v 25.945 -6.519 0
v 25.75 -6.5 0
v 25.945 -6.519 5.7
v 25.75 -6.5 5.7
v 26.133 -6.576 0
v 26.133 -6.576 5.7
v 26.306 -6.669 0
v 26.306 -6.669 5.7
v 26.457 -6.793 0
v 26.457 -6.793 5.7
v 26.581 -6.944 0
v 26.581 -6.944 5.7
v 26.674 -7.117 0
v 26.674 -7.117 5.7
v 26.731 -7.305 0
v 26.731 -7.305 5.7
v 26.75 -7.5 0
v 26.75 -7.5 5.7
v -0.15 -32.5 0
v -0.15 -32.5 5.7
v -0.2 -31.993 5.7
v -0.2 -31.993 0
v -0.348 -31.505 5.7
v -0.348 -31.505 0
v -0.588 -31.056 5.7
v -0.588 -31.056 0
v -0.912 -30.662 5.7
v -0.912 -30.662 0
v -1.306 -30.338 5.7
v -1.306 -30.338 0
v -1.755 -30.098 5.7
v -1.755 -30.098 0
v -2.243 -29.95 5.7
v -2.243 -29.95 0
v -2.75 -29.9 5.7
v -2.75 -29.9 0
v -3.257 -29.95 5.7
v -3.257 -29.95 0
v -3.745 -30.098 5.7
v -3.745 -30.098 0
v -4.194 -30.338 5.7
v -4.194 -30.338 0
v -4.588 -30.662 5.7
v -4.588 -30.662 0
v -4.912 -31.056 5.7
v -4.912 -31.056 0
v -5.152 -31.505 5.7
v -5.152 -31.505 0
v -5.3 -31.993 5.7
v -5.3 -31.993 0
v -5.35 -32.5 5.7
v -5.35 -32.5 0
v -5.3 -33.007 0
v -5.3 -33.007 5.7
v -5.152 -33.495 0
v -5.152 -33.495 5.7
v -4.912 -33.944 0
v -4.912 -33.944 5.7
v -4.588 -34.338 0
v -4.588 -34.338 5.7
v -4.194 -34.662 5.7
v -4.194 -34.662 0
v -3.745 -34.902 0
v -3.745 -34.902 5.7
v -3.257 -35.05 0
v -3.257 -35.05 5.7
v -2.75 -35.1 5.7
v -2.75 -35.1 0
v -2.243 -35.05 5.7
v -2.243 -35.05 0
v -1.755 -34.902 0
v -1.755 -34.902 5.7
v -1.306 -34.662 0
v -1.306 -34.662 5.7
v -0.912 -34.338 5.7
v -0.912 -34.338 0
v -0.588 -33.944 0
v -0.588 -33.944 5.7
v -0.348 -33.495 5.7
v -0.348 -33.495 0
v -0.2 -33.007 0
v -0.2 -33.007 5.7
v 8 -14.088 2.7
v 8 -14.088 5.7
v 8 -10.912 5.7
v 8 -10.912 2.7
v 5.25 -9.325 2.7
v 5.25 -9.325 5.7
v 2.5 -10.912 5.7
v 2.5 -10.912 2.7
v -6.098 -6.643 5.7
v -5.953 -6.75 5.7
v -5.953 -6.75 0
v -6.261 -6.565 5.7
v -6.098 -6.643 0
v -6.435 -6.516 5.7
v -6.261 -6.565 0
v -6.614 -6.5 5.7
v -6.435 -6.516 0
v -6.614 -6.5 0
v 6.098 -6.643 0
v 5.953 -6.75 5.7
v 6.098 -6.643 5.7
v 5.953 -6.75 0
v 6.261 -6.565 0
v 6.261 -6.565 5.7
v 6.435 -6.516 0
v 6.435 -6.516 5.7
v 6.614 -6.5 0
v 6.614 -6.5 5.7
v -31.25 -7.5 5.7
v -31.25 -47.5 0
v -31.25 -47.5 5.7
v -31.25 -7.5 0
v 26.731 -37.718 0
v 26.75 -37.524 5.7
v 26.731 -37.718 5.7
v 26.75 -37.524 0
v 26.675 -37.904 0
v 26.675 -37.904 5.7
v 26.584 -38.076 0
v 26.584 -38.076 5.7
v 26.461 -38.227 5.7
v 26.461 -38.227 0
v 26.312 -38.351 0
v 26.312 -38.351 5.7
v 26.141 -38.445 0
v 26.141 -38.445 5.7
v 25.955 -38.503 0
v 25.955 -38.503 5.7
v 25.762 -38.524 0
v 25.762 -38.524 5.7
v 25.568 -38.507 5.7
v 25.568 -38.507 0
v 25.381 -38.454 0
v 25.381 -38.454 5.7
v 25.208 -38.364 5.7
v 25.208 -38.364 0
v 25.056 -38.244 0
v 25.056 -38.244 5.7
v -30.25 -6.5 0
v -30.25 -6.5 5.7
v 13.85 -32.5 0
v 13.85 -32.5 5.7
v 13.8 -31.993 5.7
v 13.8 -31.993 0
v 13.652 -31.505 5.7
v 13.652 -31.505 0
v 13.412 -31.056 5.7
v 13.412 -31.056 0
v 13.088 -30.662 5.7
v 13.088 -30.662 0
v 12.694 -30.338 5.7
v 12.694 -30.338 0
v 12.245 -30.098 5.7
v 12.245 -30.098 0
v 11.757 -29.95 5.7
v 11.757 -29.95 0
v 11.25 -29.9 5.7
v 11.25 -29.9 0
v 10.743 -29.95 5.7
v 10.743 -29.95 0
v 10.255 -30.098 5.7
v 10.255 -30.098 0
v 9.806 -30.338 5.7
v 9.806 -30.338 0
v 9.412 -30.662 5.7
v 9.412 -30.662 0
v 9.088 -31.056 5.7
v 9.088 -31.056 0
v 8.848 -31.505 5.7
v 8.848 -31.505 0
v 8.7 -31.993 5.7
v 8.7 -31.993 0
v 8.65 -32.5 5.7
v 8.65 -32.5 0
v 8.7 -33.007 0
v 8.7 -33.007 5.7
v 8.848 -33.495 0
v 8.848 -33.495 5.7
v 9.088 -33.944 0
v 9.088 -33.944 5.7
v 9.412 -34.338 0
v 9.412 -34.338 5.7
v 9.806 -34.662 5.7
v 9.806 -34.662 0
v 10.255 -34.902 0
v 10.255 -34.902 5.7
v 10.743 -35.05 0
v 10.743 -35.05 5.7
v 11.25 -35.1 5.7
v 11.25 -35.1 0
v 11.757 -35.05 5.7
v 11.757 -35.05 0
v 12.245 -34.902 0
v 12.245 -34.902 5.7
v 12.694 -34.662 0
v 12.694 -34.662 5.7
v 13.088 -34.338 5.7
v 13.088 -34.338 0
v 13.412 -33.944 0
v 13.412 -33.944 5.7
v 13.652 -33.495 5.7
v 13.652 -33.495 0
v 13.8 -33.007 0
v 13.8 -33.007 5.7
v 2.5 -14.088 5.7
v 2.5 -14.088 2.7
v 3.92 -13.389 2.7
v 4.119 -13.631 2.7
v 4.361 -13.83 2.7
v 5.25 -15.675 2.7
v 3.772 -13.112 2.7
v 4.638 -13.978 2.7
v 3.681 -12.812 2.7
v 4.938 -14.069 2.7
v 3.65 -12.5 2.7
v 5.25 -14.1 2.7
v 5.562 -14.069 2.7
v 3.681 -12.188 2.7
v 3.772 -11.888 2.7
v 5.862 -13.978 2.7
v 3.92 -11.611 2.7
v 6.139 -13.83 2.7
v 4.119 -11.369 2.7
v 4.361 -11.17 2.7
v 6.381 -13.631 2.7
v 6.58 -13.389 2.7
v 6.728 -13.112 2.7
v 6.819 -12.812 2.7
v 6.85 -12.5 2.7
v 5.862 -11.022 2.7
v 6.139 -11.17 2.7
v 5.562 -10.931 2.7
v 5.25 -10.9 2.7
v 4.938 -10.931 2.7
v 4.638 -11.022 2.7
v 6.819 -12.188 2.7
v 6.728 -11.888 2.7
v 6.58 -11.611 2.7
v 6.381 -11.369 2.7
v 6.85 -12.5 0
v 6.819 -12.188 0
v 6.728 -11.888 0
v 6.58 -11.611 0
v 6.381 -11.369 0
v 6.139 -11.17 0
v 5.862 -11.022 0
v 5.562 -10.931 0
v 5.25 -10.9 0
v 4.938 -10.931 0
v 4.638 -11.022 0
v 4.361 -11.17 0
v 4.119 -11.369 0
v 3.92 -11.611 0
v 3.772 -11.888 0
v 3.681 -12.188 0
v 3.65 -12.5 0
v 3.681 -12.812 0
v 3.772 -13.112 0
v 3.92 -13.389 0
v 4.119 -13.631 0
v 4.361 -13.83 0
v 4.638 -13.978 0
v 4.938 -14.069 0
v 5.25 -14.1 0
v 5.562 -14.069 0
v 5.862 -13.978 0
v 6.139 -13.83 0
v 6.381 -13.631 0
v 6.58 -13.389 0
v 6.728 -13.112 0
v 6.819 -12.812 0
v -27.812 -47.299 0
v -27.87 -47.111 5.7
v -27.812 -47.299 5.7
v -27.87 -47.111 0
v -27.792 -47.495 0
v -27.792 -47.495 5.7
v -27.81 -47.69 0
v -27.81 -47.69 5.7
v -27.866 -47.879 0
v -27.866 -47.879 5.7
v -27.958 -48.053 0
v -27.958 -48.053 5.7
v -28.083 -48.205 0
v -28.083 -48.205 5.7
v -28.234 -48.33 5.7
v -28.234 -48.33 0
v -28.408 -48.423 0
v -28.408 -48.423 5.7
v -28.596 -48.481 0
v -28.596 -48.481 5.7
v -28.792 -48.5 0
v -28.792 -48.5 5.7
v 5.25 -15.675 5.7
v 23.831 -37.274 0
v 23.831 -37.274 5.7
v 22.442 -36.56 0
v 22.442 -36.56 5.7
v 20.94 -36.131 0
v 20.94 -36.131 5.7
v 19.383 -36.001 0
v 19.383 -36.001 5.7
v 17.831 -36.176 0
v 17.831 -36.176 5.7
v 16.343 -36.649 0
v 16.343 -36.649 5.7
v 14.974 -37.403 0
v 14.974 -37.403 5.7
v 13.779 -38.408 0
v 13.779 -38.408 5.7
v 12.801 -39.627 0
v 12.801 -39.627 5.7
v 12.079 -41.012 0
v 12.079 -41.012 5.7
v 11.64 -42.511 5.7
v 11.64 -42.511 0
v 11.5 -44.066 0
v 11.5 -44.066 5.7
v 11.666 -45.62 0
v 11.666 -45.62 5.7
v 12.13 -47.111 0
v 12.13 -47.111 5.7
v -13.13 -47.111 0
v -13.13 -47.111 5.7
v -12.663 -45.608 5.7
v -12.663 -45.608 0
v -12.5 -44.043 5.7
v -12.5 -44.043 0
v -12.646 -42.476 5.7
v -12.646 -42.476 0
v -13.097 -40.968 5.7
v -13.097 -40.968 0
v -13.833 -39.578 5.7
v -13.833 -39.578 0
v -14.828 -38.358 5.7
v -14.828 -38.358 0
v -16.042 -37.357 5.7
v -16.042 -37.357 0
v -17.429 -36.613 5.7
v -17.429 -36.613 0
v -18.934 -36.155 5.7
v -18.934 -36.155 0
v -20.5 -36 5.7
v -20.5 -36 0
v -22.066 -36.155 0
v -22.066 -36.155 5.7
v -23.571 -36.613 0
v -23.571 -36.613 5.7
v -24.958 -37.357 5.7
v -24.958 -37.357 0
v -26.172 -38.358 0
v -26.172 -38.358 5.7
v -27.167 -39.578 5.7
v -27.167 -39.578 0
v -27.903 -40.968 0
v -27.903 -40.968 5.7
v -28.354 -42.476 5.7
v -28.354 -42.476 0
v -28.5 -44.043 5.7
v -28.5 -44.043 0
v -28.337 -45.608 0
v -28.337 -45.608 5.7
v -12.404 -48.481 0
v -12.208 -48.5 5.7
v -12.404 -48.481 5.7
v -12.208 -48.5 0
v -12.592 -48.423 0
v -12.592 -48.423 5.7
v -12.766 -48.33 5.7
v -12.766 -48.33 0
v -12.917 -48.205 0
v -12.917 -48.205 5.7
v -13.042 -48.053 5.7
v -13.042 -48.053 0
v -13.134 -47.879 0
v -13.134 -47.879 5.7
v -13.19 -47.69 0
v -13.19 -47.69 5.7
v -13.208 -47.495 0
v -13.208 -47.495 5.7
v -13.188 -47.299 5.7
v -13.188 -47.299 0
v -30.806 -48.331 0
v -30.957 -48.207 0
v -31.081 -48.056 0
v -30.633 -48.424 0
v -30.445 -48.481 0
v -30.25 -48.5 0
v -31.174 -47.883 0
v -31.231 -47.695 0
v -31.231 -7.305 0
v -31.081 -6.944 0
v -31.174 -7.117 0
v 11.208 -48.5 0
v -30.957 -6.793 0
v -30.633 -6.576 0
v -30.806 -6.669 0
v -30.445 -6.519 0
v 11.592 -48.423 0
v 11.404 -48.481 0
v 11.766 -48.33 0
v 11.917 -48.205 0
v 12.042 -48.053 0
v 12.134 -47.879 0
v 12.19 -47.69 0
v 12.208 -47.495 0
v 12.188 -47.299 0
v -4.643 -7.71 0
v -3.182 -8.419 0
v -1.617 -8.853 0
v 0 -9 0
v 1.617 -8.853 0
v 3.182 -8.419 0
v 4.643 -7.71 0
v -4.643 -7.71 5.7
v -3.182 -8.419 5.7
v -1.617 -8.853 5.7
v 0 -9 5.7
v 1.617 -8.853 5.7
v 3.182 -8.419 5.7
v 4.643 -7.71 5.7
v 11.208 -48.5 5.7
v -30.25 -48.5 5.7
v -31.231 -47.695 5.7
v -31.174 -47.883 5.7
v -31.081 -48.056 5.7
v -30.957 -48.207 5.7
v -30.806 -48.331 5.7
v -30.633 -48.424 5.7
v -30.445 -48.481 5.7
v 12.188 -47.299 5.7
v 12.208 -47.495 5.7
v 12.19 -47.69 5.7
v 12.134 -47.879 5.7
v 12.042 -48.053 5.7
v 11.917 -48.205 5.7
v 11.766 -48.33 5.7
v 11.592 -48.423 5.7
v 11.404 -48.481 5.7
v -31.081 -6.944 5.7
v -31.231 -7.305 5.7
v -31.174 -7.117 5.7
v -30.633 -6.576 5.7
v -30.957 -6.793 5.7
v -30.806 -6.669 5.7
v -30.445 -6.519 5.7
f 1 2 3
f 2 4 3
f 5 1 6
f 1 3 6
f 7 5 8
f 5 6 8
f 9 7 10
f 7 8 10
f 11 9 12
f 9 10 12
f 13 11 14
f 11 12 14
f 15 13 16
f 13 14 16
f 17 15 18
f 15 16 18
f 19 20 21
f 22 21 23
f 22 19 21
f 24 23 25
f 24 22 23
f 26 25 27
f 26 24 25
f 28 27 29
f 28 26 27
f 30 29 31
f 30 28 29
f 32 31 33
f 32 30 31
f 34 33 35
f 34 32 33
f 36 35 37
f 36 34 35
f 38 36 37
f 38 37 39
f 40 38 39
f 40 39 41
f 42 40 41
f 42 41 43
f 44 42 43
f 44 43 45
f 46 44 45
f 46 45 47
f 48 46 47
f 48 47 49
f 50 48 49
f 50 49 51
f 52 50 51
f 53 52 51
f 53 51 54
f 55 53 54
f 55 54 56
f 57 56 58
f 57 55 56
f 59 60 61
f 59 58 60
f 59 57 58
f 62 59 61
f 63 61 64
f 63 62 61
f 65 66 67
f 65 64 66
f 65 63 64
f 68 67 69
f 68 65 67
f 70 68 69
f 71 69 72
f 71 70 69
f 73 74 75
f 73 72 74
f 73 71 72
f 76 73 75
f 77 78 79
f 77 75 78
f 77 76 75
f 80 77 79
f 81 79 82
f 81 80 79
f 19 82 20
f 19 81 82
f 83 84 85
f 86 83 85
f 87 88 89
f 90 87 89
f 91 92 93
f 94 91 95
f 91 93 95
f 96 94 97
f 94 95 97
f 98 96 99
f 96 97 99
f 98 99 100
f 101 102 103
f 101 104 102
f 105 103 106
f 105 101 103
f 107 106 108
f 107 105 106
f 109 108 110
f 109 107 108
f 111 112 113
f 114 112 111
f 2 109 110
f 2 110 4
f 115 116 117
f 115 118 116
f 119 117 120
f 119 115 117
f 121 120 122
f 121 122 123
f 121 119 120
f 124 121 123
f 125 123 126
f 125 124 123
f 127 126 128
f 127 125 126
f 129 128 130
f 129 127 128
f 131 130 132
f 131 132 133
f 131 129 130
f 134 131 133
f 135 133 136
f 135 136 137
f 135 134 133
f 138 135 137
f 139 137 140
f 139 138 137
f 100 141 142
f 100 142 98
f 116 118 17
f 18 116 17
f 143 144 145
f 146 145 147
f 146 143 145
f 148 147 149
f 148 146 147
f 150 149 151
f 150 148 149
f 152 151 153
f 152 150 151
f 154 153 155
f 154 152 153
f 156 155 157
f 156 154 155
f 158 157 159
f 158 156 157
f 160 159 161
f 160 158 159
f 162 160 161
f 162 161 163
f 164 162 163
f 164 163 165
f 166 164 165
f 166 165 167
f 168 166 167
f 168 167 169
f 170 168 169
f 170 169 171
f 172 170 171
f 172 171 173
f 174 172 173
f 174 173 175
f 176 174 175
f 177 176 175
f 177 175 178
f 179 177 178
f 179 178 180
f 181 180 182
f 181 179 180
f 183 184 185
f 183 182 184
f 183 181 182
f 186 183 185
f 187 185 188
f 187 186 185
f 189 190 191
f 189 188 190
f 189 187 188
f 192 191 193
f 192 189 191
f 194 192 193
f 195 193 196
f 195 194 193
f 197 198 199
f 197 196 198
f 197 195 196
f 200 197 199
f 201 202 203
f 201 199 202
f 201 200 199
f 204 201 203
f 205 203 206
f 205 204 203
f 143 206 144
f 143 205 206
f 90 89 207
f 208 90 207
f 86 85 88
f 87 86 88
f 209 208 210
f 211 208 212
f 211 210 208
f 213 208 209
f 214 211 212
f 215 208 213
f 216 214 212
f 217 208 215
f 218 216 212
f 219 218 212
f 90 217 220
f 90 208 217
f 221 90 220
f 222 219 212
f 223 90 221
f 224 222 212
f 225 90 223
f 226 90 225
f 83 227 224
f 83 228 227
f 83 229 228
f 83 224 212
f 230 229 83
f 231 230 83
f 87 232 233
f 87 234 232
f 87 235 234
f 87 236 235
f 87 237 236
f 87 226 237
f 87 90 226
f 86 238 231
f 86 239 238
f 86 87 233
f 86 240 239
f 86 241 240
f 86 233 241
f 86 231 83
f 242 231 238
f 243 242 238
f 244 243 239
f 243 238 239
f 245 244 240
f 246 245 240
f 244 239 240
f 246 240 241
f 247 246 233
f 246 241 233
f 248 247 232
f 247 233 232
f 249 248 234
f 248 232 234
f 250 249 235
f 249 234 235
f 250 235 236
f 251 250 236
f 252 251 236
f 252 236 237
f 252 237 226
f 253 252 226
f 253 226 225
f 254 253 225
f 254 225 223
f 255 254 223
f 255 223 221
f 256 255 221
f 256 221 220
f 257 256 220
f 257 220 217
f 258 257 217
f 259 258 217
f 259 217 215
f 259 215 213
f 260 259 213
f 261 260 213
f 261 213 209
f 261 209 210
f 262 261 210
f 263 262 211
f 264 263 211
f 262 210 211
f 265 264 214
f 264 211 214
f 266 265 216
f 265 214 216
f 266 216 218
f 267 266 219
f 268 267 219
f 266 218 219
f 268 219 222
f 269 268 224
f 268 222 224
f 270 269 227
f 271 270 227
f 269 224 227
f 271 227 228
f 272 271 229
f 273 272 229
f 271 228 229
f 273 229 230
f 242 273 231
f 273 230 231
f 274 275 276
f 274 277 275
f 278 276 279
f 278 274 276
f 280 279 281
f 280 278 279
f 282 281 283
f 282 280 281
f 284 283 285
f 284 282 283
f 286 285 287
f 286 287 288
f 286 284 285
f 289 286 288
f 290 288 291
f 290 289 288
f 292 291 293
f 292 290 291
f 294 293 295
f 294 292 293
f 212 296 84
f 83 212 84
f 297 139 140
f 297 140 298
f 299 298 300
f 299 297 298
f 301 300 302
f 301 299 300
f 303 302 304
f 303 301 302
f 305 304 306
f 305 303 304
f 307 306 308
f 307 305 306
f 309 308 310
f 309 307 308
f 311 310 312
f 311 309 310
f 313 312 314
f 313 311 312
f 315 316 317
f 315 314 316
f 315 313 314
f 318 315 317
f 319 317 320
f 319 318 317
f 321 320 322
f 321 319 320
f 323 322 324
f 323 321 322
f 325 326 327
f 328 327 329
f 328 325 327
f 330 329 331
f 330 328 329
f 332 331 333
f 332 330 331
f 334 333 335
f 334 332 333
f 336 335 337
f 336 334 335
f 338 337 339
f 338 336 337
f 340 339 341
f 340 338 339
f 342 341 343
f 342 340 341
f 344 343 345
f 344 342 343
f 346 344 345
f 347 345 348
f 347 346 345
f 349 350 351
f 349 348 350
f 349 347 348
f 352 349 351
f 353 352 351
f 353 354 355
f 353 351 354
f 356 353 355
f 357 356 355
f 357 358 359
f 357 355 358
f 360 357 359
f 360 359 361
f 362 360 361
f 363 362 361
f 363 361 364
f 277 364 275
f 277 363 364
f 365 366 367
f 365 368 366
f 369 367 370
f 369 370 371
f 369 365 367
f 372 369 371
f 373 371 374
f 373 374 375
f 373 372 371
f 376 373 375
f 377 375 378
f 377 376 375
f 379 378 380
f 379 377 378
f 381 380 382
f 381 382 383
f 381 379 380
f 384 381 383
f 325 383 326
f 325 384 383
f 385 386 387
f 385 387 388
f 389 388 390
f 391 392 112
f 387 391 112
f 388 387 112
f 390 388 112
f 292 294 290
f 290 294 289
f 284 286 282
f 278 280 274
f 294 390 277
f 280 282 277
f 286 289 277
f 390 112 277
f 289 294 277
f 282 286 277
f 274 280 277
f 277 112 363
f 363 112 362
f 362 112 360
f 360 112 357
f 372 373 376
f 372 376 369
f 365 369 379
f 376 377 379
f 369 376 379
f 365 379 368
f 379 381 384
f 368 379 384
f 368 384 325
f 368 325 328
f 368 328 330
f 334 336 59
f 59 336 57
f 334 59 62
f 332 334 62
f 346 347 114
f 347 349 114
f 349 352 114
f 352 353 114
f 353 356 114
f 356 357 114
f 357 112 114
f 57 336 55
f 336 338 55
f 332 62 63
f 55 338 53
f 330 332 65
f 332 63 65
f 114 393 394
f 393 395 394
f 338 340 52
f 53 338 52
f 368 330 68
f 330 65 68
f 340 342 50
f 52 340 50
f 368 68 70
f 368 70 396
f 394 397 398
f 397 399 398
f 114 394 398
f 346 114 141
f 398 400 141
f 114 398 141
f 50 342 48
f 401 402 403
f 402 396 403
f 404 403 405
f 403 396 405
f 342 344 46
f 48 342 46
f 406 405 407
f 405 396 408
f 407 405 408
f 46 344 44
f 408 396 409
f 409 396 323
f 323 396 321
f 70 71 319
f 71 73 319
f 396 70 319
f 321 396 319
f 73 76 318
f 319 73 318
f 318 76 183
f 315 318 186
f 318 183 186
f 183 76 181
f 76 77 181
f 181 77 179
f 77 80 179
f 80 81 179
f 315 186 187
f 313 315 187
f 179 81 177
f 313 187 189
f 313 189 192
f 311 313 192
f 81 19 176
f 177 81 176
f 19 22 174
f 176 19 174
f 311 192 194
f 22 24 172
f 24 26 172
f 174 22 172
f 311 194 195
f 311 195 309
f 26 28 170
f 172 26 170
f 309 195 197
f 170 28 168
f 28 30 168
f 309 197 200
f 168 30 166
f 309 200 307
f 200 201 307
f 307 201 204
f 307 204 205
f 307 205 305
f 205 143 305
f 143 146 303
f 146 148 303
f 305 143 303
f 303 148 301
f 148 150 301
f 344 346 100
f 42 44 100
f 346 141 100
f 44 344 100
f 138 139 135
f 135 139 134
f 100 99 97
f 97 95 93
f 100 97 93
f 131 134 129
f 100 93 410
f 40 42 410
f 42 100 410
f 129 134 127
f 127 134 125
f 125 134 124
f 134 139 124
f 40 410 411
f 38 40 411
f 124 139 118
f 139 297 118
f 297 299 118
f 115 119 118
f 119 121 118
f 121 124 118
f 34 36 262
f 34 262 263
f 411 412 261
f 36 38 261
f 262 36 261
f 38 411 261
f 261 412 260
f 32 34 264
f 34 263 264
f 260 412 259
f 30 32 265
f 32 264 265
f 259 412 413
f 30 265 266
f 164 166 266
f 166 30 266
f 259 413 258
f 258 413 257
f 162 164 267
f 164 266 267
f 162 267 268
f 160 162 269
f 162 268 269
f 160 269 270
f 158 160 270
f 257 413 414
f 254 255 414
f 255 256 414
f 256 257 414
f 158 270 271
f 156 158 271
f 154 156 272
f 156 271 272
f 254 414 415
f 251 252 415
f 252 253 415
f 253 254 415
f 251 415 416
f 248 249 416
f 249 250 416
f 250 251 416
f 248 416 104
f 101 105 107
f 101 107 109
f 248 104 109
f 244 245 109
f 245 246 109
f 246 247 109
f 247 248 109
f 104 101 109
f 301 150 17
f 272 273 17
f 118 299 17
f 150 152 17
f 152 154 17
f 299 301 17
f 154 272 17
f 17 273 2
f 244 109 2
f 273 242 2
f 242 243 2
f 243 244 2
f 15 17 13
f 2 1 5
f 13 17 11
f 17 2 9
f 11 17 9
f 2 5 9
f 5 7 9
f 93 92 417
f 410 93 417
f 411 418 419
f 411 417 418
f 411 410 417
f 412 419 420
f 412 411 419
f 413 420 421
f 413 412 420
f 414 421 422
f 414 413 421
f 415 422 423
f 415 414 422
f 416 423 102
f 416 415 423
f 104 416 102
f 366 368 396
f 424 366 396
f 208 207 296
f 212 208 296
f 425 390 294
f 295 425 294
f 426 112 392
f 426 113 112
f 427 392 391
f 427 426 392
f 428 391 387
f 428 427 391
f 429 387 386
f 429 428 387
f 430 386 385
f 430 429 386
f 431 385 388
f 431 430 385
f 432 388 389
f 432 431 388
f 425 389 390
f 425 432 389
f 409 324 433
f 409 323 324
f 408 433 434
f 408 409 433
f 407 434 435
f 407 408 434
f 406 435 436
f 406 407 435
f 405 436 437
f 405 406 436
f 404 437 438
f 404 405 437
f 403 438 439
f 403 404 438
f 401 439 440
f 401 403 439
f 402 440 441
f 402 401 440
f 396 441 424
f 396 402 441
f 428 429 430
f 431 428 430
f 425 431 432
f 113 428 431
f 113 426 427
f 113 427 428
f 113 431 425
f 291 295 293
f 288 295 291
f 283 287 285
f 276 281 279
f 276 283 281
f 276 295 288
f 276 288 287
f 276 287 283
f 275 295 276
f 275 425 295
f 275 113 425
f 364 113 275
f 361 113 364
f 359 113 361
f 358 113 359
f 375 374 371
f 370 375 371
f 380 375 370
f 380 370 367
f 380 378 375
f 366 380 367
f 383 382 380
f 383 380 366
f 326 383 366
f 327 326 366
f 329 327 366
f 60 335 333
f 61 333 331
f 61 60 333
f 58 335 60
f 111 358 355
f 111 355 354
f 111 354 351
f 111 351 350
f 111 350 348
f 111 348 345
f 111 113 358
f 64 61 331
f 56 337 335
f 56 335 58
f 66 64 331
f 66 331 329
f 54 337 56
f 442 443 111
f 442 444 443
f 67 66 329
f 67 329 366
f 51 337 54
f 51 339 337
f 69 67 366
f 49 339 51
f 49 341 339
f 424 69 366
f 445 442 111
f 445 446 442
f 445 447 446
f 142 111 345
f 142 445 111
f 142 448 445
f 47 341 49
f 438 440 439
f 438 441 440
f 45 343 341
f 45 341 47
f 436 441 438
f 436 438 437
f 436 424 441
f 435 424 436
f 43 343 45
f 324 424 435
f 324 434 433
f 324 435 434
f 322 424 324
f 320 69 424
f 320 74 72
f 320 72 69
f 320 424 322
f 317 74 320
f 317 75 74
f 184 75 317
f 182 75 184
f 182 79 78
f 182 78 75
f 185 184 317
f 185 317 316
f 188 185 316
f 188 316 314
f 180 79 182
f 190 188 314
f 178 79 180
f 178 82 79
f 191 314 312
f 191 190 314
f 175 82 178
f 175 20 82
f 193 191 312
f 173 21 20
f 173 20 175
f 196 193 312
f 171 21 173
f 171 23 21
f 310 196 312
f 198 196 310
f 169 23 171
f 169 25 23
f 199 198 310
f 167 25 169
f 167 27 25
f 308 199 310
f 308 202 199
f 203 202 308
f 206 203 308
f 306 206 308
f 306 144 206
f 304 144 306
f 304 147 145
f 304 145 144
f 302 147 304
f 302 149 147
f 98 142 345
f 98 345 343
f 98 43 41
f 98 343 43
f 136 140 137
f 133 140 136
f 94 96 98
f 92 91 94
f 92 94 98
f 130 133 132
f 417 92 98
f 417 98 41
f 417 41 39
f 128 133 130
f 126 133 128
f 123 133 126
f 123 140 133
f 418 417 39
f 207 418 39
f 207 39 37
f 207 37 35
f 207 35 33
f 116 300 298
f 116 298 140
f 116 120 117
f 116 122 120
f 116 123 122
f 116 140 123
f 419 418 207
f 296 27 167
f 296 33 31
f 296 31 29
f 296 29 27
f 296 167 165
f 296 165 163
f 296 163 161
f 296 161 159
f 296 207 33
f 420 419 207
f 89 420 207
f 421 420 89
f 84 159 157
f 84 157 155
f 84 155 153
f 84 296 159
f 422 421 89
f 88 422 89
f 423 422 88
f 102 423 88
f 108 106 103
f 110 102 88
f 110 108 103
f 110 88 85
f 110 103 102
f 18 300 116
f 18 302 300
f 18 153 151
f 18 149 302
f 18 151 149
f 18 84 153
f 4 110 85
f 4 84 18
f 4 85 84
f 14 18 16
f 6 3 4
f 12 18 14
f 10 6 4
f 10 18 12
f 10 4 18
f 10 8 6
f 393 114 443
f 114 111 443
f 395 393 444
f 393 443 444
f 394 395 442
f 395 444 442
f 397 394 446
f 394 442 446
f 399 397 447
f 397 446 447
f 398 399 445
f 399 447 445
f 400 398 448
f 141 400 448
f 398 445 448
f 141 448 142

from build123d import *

# Parameters (mm, degrees)
SKIZZE2_W                       = 58
SKIZZE2_H                       = 42
AUFSATZ_LINEAR_AUSTRAGEN1_DEPTH = 5.7
SKIZZE1_R                       = 9
SKIZZE1_R_2                     = 8
SKIZZE1_R_3                     = 2.6
SCHNITT_LINEAR_AUSTRAGEN2_DEPTH = 58.976741026
SCHNITT_LINEAR_AUSTRAGEN3_DEPTH = 58.976741026
VERRUNDUNG1_R                   = 1
SCHNITT_LINEAR_AUSTRAGEN4_DEPTH = 3
SKIZZE5_R                       = 1.6
SCHNITT_LINEAR_AUSTRAGEN5_DEPTH = 58.773804618


with BuildPart() as part:
    # Skizze2 → Aufsatz-Linear austragen1 (new body)
    with BuildSketch(Plane.XY):
        with Locations((-2.25, -27.5)):
            Rectangle(SKIZZE2_W, SKIZZE2_H)
    extrude(amount=AUFSATZ_LINEAR_AUSTRAGEN1_DEPTH)

    # Skizze1 → Schnitt-Linear austragen2 (cut, through all)
    with BuildSketch(Plane.XY):
        Circle(SKIZZE1_R)
        with Locations((-20.5, -44)):
            Circle(SKIZZE1_R_2)
        with Locations((19.5, -44)):
            Circle(SKIZZE1_R_2)
        with Locations((11.25, -32.5)):
            Circle(SKIZZE1_R_3)
        with Locations((-2.75, -32.5)):
            Circle(SKIZZE1_R_3)
    extrude(amount=SCHNITT_LINEAR_AUSTRAGEN2_DEPTH, mode=Mode.SUBTRACT)


with BuildPart() as schnitt_linear_austragen2_piece_1:
    # of the separate pieces the step leaves, piece 1, a body of its own (schnitt_linear_austragen2_pieces)
    add(part.part.solids().sort_by_distance((-31.25, -6.5, 0))[0])

    # Verrundung1
    verrundung1_edges = [schnitt_linear_austragen2_piece_1.edges().sort_by_distance(p)[0] for p in [
        (26.75, -6.5, 2.85),
        (-31.25, -48.5, 2.85),
        (-31.25, -6.5, 2.85),
        (-13.885621722, -48.5, 2.85),
        (-27.114378278, -48.5, 2.85),
        (26.75, -40.618062685, 2.85),
        (12.885621722, -48.5, 2.85),
        (-6.224949799, -6.5, 2.85),
        (6.224949799, -6.5, 2.85),
    ]]
    fillet(verrundung1_edges, radius=VERRUNDUNG1_R)

    # Skizze4 → Schnitt-Linear austragen4 (cut)
    with BuildSketch(Plane.XY.offset(5.7)):
        Polygon((2.5, -14.08771324), (5.25, -15.675426481), (8, -14.08771324), (8, -10.91228676), (5.25, -9.324573519), (2.5, -10.91228676), align=None)
    extrude(amount=-SCHNITT_LINEAR_AUSTRAGEN4_DEPTH, mode=Mode.SUBTRACT)

    # Skizze5 → Schnitt-Linear austragen5 (cut, through all)
    with BuildSketch(Plane.XY.offset(2.7)):
        with Locations((5.25, -12.5)):
            Circle(SKIZZE5_R)
    extrude(amount=-SCHNITT_LINEAR_AUSTRAGEN5_DEPTH, mode=Mode.SUBTRACT)


with BuildPart() as schnitt_linear_austragen2_piece_2:
    # of the separate pieces the step leaves, piece 2, a body of its own (schnitt_linear_austragen2_pieces)
    add(part.part.solids().sort_by_distance((26.114378278, -48.5, 0))[0])

    # Skizze3 → Schnitt-Linear austragen3 (cut, through all)
    with BuildSketch(Plane.XY.offset(5.7)):
        with BuildLine():
            Line((26.75, -48.5), (26.75, -47.381937315))
            ThreePointArc((26.75, -47.381937315), (26.454693545, -47.953762474), (26.114378278, -48.5))
            Line((26.114378278, -48.5), (26.75, -48.5))
        make_face()
    extrude(amount=-SCHNITT_LINEAR_AUSTRAGEN3_DEPTH, mode=Mode.SUBTRACT)


solid = schnitt_linear_austragen2_piece_1.part
